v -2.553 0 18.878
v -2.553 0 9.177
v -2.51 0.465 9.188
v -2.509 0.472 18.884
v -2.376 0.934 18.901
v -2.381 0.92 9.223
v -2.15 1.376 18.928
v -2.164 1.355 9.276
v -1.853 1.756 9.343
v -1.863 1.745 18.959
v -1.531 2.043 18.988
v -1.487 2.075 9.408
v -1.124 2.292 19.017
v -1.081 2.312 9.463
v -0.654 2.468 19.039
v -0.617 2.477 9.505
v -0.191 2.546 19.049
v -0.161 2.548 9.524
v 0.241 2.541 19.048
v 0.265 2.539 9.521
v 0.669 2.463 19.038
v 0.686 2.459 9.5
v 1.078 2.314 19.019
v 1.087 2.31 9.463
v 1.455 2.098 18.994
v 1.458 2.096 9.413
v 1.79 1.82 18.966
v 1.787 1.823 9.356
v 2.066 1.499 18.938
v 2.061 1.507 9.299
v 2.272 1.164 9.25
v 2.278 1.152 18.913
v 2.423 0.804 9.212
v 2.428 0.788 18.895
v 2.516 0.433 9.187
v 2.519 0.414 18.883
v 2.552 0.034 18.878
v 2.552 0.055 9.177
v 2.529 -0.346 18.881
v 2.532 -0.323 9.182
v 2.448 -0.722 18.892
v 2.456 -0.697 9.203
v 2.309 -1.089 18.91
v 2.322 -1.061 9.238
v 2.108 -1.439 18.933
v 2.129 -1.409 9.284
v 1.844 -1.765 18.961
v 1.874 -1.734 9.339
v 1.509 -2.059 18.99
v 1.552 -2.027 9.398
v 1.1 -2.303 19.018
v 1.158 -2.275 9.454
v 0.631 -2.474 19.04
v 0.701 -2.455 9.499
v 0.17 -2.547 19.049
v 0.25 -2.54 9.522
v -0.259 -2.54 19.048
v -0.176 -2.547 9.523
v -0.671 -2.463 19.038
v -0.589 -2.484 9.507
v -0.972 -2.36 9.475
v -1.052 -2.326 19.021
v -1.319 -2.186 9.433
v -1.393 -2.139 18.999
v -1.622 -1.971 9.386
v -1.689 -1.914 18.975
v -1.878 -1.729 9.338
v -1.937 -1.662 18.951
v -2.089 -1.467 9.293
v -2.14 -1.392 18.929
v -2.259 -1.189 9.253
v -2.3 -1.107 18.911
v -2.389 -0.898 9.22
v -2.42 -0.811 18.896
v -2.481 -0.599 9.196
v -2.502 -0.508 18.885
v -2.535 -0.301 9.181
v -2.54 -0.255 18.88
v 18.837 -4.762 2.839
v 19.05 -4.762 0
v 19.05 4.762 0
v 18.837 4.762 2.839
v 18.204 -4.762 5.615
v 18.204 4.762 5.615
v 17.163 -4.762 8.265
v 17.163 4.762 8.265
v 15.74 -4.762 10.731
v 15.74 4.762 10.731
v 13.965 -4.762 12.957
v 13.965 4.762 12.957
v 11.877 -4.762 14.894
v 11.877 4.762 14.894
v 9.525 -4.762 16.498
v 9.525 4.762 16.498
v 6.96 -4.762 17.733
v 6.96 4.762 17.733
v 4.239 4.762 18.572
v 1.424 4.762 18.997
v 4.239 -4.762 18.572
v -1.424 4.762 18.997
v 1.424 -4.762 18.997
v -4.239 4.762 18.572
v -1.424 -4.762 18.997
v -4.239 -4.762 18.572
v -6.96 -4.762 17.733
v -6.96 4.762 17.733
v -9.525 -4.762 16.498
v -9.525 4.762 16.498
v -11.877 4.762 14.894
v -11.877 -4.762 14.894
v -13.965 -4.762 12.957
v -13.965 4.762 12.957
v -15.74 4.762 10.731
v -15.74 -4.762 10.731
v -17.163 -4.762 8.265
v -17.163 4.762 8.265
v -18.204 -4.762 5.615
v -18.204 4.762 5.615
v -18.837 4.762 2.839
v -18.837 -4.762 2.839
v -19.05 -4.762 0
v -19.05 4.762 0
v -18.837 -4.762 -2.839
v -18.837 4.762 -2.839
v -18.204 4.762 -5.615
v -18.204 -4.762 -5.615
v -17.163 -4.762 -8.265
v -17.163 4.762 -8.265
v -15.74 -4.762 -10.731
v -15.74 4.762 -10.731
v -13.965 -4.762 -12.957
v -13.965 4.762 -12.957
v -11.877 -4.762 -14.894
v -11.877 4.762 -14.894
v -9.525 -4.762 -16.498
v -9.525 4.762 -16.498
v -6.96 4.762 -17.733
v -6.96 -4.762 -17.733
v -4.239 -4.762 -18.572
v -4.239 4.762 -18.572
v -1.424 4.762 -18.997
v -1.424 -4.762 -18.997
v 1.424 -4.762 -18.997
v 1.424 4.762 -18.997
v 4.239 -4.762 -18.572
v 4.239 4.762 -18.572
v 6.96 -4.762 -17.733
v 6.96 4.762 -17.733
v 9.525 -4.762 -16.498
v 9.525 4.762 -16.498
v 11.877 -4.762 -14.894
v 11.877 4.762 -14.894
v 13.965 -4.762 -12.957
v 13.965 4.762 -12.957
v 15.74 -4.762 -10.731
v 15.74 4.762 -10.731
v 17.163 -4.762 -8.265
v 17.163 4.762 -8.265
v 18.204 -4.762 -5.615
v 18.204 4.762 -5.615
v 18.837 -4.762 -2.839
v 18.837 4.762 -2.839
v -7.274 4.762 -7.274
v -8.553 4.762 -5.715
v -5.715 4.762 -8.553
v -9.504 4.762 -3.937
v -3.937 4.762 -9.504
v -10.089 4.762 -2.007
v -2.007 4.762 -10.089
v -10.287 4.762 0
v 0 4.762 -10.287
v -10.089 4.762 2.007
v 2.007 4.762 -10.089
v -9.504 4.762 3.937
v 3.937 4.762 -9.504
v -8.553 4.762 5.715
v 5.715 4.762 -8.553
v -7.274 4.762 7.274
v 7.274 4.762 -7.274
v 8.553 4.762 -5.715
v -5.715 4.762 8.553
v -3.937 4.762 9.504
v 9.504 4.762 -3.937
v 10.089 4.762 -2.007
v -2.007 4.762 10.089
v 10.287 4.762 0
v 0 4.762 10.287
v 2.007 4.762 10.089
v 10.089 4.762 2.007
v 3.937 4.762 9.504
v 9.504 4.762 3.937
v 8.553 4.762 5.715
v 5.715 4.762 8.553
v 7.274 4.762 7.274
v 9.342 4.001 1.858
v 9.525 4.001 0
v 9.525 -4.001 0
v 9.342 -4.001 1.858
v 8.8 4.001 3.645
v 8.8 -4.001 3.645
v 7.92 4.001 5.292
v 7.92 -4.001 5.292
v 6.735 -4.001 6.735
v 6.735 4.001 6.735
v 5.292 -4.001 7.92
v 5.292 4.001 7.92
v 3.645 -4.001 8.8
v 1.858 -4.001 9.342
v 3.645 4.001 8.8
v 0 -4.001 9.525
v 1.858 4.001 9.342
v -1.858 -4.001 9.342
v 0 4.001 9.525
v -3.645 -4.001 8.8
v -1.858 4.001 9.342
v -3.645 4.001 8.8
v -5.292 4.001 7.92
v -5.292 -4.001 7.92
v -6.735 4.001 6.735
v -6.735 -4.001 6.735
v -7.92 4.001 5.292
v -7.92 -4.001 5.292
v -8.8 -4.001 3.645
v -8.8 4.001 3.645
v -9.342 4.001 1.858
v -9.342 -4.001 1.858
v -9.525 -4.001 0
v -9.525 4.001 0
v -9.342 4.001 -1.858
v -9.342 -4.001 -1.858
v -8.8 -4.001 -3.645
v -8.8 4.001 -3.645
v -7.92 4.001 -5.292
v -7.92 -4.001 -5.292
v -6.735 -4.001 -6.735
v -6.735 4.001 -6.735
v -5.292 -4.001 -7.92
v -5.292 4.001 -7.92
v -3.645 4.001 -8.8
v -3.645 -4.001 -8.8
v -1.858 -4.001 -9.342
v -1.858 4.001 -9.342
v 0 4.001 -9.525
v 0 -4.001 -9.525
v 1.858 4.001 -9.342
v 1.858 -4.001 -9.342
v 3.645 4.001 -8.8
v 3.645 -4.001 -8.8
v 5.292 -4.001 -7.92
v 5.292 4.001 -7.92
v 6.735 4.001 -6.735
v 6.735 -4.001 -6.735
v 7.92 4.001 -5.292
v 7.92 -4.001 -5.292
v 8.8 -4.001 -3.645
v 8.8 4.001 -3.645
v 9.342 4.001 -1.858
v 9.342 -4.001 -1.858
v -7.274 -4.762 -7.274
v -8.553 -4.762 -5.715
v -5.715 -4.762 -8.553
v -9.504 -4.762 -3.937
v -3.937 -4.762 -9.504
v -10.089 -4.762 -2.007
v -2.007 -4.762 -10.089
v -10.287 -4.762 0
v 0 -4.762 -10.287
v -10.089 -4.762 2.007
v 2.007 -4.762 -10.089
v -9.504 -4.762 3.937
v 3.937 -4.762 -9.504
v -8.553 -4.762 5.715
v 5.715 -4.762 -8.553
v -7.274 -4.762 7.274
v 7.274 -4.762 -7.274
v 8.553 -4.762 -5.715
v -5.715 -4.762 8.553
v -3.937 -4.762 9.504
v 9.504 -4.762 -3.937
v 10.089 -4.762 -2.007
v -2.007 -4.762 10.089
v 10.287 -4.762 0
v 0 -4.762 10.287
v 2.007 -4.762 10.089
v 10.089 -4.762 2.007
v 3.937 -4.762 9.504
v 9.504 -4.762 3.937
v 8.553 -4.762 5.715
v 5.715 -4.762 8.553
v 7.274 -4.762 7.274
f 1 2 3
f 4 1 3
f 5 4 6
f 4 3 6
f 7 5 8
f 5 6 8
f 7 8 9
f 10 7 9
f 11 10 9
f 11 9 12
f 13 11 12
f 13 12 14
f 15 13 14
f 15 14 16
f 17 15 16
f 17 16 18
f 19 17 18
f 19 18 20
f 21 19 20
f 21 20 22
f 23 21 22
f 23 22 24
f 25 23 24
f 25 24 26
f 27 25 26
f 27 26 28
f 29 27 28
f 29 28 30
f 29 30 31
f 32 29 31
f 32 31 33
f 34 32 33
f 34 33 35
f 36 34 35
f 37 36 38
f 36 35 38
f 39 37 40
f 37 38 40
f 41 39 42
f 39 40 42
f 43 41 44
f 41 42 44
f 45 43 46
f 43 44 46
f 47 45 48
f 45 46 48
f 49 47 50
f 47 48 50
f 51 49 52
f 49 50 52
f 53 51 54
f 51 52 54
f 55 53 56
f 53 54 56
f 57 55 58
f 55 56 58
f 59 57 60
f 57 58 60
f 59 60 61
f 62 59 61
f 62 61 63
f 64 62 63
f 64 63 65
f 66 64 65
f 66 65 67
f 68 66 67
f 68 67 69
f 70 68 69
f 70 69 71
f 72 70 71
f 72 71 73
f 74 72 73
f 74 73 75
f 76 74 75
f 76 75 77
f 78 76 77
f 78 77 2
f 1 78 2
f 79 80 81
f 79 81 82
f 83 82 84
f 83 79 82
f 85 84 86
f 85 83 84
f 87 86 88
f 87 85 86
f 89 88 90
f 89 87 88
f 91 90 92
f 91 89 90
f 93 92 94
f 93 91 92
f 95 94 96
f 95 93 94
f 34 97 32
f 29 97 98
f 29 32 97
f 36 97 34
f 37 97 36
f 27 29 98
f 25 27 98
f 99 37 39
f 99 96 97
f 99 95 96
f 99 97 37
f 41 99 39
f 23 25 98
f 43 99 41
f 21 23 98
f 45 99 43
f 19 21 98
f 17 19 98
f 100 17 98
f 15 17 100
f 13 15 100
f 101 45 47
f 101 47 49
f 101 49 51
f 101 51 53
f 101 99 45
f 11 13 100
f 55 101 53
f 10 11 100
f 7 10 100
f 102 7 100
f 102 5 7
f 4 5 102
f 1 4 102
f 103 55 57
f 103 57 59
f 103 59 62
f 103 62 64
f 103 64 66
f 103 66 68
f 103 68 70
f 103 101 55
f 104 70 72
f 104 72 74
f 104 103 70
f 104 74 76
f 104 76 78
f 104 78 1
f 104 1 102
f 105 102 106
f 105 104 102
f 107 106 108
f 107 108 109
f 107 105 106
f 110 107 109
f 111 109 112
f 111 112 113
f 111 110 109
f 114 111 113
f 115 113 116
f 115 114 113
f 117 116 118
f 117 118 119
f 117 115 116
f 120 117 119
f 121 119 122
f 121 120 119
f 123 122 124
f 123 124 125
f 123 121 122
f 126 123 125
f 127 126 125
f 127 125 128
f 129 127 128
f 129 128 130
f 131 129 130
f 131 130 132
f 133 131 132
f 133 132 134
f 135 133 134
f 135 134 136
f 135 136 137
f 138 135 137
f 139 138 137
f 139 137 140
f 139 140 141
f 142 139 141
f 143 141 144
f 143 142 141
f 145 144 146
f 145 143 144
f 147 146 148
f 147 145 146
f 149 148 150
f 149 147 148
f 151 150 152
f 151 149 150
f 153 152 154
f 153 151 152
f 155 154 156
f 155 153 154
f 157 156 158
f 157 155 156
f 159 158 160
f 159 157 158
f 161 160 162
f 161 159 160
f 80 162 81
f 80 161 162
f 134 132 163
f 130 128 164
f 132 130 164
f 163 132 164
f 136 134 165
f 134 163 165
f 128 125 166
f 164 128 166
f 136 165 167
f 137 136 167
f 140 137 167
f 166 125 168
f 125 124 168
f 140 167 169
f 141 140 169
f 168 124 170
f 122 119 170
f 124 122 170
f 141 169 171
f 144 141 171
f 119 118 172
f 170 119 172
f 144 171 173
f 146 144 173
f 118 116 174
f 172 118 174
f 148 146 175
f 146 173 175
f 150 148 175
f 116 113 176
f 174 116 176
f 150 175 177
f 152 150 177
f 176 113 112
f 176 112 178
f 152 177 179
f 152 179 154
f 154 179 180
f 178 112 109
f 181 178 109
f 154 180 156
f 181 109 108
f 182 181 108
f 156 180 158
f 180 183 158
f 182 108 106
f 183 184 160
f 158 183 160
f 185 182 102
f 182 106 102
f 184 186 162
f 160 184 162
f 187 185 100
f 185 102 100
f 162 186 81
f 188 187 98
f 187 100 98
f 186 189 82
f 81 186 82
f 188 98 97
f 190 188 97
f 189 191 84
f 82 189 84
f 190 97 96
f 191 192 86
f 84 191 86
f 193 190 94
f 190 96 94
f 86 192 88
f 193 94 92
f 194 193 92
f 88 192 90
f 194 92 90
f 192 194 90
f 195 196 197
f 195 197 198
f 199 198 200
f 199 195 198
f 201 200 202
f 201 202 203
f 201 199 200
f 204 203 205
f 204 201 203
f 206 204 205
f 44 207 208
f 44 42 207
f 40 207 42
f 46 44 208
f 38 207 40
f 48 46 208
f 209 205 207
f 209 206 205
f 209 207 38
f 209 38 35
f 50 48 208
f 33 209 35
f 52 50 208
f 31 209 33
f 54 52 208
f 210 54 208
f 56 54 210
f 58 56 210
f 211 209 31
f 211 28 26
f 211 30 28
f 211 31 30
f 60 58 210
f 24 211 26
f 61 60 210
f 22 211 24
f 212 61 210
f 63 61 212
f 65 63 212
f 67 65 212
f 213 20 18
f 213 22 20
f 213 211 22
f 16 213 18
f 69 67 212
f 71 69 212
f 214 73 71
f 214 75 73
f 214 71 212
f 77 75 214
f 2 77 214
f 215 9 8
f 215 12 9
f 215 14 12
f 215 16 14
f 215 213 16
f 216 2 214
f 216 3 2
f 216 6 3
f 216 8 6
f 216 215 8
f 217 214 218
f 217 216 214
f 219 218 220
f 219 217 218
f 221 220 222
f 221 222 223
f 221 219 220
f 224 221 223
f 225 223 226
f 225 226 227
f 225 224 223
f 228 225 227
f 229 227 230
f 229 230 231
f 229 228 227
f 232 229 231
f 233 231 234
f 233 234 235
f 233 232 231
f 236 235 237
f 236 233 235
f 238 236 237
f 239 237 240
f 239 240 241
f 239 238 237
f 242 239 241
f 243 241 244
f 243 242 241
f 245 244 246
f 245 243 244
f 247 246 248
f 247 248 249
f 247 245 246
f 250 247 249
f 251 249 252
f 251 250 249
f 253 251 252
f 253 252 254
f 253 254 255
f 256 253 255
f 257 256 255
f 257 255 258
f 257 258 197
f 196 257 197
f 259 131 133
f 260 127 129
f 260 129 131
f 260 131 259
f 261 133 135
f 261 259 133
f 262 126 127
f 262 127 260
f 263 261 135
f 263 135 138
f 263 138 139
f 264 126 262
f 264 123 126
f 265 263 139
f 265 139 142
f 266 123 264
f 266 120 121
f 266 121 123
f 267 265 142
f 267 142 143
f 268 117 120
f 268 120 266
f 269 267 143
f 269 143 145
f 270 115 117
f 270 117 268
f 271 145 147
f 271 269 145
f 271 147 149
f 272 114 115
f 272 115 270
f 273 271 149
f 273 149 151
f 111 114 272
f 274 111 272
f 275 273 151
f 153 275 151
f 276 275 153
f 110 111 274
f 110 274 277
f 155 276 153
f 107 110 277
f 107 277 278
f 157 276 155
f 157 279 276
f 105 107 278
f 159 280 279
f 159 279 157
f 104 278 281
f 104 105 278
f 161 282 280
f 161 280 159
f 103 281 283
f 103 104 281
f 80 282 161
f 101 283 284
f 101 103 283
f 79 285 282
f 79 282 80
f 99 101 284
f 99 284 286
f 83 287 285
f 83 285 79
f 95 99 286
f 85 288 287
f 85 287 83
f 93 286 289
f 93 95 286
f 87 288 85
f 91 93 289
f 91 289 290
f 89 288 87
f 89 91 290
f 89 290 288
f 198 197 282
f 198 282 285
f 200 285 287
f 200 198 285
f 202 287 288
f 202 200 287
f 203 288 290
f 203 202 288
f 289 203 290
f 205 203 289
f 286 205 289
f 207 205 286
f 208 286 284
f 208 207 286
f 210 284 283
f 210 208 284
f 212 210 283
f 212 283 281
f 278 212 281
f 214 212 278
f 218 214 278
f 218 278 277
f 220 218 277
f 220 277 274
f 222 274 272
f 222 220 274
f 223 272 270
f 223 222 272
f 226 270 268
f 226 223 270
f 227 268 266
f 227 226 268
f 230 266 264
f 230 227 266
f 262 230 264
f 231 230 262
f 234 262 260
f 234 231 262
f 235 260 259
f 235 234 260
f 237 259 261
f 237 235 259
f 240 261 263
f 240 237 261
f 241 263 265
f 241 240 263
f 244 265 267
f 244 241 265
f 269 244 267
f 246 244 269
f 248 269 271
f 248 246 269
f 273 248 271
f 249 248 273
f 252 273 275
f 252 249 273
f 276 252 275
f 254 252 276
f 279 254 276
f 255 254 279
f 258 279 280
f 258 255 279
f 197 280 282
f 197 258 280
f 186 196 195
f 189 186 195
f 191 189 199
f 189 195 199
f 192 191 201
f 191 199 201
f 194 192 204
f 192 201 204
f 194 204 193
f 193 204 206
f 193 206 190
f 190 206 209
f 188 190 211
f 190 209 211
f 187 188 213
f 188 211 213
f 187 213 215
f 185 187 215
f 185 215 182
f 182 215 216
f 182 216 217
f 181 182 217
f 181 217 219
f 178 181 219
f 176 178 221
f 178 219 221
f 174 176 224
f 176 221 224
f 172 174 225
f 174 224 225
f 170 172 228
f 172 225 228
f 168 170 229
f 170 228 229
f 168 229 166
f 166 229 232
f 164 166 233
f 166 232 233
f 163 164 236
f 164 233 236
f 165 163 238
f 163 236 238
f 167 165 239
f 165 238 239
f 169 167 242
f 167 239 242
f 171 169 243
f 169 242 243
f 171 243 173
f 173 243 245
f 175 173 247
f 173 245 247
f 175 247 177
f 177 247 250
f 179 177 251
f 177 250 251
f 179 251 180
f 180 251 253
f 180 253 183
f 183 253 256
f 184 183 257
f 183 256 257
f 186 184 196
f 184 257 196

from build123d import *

# Parameters (mm, degrees)
F0_R     = 19.05
F0_R_2   = 9.525
F1_DEPTH = 4.7625
F4_D     = 5.1054
F4_DEPTH = 25.4
F4_START = 0.1718057
F4_TIP   = 1.5338169022
F5_SIZE  = 0.762


with BuildPart() as f1:
    # F0 (on Front) → F1 (new body, symmetric)
    with BuildSketch(Plane.XZ):
        Circle(F0_R)
        Circle(F0_R_2, mode=Mode.SUBTRACT)
    extrude(amount=F1_DEPTH, both=True)

    # F4
    # its depths count from where the whole tool has entered the part; down to there all is cleared
    with Locations(Plane.XY.offset(19.05).offset(-F4_START)):
        with Locations((0, 0)):
            Hole(F4_D / 2, depth=F4_DEPTH)
            with Locations((0, 0, -(F4_DEPTH + F4_TIP / 2))):  # 118° drill point
                Cone(0, F4_D / 2, F4_TIP, mode=Mode.SUBTRACT)

    # F5
    f5_edges = [f1.edges().sort_by_distance(p)[0] for p in [
        (-9.525, -4.7625, 0),
        (-9.525, 4.7625, 0),
    ]]
    chamfer(f5_edges, length=F5_SIZE)


solid = f1.part
